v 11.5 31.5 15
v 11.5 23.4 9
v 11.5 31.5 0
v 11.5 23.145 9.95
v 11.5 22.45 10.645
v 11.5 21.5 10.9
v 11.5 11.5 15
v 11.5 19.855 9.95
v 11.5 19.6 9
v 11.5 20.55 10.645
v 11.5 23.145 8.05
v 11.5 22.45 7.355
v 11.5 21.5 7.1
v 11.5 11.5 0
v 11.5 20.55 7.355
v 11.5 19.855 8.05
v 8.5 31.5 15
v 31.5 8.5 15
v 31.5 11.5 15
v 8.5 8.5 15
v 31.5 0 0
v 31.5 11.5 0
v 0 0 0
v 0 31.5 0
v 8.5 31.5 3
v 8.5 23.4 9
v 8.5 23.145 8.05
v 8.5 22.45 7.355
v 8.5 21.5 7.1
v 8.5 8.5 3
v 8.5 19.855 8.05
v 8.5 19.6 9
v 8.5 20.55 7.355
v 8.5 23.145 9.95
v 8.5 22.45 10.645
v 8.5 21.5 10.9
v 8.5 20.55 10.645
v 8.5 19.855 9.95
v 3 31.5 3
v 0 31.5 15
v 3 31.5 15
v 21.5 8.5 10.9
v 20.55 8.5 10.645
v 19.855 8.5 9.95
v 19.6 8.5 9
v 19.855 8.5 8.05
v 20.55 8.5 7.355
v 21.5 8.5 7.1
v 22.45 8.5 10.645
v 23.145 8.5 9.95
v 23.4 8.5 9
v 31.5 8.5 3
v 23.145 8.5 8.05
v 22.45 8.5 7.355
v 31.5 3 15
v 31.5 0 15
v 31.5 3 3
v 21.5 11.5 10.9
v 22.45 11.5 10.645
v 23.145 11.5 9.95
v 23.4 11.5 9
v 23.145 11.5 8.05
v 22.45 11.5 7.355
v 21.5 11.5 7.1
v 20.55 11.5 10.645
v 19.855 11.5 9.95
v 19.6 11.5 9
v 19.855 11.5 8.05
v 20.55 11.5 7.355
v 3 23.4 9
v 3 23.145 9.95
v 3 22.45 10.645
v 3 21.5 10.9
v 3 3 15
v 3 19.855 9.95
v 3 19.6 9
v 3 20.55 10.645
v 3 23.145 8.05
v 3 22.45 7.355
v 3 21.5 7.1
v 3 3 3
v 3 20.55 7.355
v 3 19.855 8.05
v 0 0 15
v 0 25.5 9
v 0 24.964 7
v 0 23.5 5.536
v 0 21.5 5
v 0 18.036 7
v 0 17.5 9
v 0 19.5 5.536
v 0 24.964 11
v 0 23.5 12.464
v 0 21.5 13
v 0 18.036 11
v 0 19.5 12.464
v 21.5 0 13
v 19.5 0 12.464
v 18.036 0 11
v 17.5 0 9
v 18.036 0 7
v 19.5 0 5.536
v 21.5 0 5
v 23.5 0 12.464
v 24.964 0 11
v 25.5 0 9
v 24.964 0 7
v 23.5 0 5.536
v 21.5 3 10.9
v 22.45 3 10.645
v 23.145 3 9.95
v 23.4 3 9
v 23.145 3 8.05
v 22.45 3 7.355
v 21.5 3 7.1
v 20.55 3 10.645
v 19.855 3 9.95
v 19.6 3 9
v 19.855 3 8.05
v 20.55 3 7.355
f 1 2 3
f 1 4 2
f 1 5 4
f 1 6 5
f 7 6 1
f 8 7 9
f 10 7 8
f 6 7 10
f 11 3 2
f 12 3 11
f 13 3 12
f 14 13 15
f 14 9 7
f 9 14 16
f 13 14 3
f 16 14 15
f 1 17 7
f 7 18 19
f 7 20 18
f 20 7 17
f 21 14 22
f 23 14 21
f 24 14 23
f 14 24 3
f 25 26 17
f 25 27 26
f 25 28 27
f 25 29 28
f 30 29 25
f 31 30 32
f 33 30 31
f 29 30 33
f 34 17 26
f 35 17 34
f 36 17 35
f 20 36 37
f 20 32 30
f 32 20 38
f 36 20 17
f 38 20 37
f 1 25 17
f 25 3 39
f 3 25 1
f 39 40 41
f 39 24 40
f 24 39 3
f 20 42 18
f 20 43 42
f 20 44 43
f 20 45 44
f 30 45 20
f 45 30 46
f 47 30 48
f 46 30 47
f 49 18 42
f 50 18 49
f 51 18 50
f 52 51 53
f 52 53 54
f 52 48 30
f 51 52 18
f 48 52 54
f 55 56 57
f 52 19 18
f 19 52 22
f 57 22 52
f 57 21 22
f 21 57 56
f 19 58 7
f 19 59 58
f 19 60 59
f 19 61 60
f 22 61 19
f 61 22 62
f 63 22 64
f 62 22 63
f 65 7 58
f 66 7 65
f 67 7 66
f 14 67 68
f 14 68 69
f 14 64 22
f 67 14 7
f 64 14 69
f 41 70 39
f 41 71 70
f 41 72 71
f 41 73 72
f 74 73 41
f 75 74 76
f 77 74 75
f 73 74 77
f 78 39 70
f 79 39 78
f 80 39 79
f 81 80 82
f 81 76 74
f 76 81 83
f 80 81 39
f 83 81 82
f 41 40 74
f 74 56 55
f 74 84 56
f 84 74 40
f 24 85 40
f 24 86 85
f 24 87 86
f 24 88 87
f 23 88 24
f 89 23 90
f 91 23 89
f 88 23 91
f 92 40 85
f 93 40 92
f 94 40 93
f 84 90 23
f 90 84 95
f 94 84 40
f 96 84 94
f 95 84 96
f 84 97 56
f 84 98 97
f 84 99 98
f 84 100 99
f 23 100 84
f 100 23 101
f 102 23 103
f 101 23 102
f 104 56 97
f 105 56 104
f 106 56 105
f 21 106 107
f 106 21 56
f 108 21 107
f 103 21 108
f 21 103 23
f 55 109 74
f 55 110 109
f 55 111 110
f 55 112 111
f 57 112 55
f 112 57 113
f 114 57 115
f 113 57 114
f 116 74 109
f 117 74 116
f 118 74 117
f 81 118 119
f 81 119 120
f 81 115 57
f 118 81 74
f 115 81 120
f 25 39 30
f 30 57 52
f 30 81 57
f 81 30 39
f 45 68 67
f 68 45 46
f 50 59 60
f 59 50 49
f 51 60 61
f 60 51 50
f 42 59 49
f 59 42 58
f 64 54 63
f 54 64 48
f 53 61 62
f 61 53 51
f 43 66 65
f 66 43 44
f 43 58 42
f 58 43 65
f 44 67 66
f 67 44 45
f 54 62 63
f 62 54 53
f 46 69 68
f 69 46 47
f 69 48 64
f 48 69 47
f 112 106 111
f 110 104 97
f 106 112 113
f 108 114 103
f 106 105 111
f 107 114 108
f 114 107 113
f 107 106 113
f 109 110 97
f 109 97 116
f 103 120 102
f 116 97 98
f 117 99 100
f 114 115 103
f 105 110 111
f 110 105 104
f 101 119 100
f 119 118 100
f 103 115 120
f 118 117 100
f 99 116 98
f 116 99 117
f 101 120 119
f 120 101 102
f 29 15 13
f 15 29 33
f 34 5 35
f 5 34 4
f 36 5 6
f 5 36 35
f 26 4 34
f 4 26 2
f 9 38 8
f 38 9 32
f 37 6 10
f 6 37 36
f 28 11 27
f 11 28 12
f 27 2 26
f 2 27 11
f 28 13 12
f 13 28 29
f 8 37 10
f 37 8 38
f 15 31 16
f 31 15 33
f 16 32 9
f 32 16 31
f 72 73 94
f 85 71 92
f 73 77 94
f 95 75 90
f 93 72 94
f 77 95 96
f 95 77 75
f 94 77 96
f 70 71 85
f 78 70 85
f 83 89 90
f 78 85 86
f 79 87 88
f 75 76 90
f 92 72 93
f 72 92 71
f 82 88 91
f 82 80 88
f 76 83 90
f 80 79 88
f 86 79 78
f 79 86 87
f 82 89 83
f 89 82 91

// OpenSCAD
difference(){
	union() {
		cube(size = [3, 31.5000000000, 15]);
		cube(size = [31.5000000000, 3, 15]);
		translate(v = [8.5000000000, 8.5000000000, 0]) {
			cube(size = [3, 23, 15]);
			cube(size = [23, 3, 15]);
		}
		cube(size = [11.5000000000, 31.5000000000, 3]);
		cube(size = [31.5000000000, 11.5000000000, 3]);
		translate(v = [21.5000000000, 0, 9.0000000000]) {
			rotate(a = 90, v = [1, 0, 0]) {
			}
		}
		translate(v = [0, 21.5000000000, 9.0000000000]) {
			rotate(a = -90, v = [0, 1, 0]) {
			}
		}
	}
	/* Holes Below*/
	union(){
		translate(v = [21.5000000000, 0, 9.0000000000]){
			rotate(a = 90, v = [1, 0, 0]){
				union() {
					union() {
						translate(v = [0, 0, -12.5000000000]) {
							cylinder($fn = 12, h = 12.5000000000, r = 1.9000000000);
						}
						translate(v = [0, 0, -3]) {
							cylinder($fn = 12, h = 3, r1 = 1.9000000000, r2 = 4);
						}
					}
					cylinder($fn = 12, h = 1, r = 4);
				}
			}
		}
		translate(v = [0, 21.5000000000, 9.0000000000]){
			rotate(a = -90, v = [0, 1, 0]){
				union() {
					union() {
						translate(v = [0, 0, -12.5000000000]) {
							cylinder($fn = 12, h = 12.5000000000, r = 1.9000000000);
						}
						translate(v = [0, 0, -3]) {
							cylinder($fn = 12, h = 3, r1 = 1.9000000000, r2 = 4);
						}
					}
					cylinder($fn = 12, h = 1, r = 4);
				}
			}
		}
	} /* End Holes */ 
}
